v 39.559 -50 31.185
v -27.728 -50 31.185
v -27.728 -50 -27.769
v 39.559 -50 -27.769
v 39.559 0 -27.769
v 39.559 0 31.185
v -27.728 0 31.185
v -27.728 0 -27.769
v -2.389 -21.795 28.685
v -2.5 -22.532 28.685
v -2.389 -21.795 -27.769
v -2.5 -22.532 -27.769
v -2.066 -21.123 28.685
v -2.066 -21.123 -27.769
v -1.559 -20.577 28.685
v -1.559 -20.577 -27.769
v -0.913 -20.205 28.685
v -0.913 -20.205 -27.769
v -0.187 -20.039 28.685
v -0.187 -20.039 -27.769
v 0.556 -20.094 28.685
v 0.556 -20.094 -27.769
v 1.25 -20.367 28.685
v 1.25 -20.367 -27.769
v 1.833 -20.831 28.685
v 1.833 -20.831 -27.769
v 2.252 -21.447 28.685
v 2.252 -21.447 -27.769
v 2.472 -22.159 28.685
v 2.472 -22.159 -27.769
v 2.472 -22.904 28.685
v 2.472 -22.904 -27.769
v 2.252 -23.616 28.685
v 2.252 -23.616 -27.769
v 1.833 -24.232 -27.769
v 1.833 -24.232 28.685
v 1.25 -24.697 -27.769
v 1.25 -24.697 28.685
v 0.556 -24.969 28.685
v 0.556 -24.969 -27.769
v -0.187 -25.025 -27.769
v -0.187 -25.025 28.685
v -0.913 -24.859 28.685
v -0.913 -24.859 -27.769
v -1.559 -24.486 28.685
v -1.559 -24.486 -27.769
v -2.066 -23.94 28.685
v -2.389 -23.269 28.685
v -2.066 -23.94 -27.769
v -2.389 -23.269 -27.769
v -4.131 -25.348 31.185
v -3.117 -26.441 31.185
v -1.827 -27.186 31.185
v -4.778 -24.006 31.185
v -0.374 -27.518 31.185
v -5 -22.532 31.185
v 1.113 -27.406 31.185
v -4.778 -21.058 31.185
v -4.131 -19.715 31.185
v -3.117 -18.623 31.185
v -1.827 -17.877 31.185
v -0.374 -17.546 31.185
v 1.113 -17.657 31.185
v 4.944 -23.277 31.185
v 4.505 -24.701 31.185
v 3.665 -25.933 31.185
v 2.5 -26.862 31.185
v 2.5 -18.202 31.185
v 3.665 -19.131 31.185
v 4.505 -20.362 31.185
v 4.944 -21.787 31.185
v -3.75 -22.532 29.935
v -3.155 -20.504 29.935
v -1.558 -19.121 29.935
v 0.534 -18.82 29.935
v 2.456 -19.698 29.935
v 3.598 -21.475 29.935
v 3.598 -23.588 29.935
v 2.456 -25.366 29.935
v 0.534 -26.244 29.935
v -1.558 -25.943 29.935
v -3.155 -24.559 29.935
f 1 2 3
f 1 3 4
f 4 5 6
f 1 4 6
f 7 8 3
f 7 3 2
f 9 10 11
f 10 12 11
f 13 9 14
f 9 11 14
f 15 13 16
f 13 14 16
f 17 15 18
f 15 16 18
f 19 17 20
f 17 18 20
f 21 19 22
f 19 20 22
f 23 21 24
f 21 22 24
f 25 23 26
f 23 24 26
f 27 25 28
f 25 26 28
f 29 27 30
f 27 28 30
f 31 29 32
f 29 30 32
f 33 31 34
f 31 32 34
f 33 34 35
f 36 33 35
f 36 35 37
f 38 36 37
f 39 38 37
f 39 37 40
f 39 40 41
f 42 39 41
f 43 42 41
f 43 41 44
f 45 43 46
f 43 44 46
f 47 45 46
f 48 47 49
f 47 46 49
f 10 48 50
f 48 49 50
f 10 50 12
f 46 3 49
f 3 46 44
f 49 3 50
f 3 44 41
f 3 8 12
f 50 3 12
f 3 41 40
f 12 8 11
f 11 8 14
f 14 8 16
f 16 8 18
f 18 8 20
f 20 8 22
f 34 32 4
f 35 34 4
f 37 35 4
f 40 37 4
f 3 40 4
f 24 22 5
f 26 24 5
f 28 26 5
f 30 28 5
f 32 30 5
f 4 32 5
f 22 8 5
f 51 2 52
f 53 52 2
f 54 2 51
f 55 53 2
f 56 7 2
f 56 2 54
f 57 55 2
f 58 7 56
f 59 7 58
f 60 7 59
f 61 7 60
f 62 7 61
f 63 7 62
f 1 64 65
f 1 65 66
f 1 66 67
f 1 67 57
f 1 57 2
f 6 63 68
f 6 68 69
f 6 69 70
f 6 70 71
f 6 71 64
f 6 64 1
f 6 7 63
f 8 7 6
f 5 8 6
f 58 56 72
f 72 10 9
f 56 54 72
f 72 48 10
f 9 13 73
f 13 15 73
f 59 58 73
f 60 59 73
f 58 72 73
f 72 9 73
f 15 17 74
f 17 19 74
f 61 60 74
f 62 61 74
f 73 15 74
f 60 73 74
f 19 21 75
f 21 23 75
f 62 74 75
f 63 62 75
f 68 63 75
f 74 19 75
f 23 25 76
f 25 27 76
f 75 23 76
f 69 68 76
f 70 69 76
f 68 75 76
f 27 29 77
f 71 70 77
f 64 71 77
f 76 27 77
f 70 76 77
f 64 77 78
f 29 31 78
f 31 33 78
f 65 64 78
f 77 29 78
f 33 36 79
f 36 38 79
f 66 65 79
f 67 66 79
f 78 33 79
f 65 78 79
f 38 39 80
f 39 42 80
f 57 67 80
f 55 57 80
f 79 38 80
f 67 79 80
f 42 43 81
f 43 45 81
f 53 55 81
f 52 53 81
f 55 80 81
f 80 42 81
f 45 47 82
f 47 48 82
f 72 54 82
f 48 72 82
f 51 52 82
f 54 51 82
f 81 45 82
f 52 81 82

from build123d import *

# Parameters (mm, degrees)
F0_W           = 67.286568
F0_H           = 58.953825
F1_DEPTH       = 50
F3_D           = 5
F3_CSINK_D     = 10
F3_CSINK_ANGLE = 90


with BuildPart() as f1:
    # F0 (on Front) → F1 (new body)
    with BuildSketch(Plane.XZ):
        with Locations((5.915298, 1.707598)):
            Rectangle(F0_W, F0_H)
    extrude(amount=F1_DEPTH)

    # F3 (through all)
    with Locations(Plane.XY.offset(31.184511)):
        with Locations((0, -22.531725)):
            CounterSinkHole(F3_D / 2, F3_CSINK_D / 2, counter_sink_angle=F3_CSINK_ANGLE)


solid = f1.part
